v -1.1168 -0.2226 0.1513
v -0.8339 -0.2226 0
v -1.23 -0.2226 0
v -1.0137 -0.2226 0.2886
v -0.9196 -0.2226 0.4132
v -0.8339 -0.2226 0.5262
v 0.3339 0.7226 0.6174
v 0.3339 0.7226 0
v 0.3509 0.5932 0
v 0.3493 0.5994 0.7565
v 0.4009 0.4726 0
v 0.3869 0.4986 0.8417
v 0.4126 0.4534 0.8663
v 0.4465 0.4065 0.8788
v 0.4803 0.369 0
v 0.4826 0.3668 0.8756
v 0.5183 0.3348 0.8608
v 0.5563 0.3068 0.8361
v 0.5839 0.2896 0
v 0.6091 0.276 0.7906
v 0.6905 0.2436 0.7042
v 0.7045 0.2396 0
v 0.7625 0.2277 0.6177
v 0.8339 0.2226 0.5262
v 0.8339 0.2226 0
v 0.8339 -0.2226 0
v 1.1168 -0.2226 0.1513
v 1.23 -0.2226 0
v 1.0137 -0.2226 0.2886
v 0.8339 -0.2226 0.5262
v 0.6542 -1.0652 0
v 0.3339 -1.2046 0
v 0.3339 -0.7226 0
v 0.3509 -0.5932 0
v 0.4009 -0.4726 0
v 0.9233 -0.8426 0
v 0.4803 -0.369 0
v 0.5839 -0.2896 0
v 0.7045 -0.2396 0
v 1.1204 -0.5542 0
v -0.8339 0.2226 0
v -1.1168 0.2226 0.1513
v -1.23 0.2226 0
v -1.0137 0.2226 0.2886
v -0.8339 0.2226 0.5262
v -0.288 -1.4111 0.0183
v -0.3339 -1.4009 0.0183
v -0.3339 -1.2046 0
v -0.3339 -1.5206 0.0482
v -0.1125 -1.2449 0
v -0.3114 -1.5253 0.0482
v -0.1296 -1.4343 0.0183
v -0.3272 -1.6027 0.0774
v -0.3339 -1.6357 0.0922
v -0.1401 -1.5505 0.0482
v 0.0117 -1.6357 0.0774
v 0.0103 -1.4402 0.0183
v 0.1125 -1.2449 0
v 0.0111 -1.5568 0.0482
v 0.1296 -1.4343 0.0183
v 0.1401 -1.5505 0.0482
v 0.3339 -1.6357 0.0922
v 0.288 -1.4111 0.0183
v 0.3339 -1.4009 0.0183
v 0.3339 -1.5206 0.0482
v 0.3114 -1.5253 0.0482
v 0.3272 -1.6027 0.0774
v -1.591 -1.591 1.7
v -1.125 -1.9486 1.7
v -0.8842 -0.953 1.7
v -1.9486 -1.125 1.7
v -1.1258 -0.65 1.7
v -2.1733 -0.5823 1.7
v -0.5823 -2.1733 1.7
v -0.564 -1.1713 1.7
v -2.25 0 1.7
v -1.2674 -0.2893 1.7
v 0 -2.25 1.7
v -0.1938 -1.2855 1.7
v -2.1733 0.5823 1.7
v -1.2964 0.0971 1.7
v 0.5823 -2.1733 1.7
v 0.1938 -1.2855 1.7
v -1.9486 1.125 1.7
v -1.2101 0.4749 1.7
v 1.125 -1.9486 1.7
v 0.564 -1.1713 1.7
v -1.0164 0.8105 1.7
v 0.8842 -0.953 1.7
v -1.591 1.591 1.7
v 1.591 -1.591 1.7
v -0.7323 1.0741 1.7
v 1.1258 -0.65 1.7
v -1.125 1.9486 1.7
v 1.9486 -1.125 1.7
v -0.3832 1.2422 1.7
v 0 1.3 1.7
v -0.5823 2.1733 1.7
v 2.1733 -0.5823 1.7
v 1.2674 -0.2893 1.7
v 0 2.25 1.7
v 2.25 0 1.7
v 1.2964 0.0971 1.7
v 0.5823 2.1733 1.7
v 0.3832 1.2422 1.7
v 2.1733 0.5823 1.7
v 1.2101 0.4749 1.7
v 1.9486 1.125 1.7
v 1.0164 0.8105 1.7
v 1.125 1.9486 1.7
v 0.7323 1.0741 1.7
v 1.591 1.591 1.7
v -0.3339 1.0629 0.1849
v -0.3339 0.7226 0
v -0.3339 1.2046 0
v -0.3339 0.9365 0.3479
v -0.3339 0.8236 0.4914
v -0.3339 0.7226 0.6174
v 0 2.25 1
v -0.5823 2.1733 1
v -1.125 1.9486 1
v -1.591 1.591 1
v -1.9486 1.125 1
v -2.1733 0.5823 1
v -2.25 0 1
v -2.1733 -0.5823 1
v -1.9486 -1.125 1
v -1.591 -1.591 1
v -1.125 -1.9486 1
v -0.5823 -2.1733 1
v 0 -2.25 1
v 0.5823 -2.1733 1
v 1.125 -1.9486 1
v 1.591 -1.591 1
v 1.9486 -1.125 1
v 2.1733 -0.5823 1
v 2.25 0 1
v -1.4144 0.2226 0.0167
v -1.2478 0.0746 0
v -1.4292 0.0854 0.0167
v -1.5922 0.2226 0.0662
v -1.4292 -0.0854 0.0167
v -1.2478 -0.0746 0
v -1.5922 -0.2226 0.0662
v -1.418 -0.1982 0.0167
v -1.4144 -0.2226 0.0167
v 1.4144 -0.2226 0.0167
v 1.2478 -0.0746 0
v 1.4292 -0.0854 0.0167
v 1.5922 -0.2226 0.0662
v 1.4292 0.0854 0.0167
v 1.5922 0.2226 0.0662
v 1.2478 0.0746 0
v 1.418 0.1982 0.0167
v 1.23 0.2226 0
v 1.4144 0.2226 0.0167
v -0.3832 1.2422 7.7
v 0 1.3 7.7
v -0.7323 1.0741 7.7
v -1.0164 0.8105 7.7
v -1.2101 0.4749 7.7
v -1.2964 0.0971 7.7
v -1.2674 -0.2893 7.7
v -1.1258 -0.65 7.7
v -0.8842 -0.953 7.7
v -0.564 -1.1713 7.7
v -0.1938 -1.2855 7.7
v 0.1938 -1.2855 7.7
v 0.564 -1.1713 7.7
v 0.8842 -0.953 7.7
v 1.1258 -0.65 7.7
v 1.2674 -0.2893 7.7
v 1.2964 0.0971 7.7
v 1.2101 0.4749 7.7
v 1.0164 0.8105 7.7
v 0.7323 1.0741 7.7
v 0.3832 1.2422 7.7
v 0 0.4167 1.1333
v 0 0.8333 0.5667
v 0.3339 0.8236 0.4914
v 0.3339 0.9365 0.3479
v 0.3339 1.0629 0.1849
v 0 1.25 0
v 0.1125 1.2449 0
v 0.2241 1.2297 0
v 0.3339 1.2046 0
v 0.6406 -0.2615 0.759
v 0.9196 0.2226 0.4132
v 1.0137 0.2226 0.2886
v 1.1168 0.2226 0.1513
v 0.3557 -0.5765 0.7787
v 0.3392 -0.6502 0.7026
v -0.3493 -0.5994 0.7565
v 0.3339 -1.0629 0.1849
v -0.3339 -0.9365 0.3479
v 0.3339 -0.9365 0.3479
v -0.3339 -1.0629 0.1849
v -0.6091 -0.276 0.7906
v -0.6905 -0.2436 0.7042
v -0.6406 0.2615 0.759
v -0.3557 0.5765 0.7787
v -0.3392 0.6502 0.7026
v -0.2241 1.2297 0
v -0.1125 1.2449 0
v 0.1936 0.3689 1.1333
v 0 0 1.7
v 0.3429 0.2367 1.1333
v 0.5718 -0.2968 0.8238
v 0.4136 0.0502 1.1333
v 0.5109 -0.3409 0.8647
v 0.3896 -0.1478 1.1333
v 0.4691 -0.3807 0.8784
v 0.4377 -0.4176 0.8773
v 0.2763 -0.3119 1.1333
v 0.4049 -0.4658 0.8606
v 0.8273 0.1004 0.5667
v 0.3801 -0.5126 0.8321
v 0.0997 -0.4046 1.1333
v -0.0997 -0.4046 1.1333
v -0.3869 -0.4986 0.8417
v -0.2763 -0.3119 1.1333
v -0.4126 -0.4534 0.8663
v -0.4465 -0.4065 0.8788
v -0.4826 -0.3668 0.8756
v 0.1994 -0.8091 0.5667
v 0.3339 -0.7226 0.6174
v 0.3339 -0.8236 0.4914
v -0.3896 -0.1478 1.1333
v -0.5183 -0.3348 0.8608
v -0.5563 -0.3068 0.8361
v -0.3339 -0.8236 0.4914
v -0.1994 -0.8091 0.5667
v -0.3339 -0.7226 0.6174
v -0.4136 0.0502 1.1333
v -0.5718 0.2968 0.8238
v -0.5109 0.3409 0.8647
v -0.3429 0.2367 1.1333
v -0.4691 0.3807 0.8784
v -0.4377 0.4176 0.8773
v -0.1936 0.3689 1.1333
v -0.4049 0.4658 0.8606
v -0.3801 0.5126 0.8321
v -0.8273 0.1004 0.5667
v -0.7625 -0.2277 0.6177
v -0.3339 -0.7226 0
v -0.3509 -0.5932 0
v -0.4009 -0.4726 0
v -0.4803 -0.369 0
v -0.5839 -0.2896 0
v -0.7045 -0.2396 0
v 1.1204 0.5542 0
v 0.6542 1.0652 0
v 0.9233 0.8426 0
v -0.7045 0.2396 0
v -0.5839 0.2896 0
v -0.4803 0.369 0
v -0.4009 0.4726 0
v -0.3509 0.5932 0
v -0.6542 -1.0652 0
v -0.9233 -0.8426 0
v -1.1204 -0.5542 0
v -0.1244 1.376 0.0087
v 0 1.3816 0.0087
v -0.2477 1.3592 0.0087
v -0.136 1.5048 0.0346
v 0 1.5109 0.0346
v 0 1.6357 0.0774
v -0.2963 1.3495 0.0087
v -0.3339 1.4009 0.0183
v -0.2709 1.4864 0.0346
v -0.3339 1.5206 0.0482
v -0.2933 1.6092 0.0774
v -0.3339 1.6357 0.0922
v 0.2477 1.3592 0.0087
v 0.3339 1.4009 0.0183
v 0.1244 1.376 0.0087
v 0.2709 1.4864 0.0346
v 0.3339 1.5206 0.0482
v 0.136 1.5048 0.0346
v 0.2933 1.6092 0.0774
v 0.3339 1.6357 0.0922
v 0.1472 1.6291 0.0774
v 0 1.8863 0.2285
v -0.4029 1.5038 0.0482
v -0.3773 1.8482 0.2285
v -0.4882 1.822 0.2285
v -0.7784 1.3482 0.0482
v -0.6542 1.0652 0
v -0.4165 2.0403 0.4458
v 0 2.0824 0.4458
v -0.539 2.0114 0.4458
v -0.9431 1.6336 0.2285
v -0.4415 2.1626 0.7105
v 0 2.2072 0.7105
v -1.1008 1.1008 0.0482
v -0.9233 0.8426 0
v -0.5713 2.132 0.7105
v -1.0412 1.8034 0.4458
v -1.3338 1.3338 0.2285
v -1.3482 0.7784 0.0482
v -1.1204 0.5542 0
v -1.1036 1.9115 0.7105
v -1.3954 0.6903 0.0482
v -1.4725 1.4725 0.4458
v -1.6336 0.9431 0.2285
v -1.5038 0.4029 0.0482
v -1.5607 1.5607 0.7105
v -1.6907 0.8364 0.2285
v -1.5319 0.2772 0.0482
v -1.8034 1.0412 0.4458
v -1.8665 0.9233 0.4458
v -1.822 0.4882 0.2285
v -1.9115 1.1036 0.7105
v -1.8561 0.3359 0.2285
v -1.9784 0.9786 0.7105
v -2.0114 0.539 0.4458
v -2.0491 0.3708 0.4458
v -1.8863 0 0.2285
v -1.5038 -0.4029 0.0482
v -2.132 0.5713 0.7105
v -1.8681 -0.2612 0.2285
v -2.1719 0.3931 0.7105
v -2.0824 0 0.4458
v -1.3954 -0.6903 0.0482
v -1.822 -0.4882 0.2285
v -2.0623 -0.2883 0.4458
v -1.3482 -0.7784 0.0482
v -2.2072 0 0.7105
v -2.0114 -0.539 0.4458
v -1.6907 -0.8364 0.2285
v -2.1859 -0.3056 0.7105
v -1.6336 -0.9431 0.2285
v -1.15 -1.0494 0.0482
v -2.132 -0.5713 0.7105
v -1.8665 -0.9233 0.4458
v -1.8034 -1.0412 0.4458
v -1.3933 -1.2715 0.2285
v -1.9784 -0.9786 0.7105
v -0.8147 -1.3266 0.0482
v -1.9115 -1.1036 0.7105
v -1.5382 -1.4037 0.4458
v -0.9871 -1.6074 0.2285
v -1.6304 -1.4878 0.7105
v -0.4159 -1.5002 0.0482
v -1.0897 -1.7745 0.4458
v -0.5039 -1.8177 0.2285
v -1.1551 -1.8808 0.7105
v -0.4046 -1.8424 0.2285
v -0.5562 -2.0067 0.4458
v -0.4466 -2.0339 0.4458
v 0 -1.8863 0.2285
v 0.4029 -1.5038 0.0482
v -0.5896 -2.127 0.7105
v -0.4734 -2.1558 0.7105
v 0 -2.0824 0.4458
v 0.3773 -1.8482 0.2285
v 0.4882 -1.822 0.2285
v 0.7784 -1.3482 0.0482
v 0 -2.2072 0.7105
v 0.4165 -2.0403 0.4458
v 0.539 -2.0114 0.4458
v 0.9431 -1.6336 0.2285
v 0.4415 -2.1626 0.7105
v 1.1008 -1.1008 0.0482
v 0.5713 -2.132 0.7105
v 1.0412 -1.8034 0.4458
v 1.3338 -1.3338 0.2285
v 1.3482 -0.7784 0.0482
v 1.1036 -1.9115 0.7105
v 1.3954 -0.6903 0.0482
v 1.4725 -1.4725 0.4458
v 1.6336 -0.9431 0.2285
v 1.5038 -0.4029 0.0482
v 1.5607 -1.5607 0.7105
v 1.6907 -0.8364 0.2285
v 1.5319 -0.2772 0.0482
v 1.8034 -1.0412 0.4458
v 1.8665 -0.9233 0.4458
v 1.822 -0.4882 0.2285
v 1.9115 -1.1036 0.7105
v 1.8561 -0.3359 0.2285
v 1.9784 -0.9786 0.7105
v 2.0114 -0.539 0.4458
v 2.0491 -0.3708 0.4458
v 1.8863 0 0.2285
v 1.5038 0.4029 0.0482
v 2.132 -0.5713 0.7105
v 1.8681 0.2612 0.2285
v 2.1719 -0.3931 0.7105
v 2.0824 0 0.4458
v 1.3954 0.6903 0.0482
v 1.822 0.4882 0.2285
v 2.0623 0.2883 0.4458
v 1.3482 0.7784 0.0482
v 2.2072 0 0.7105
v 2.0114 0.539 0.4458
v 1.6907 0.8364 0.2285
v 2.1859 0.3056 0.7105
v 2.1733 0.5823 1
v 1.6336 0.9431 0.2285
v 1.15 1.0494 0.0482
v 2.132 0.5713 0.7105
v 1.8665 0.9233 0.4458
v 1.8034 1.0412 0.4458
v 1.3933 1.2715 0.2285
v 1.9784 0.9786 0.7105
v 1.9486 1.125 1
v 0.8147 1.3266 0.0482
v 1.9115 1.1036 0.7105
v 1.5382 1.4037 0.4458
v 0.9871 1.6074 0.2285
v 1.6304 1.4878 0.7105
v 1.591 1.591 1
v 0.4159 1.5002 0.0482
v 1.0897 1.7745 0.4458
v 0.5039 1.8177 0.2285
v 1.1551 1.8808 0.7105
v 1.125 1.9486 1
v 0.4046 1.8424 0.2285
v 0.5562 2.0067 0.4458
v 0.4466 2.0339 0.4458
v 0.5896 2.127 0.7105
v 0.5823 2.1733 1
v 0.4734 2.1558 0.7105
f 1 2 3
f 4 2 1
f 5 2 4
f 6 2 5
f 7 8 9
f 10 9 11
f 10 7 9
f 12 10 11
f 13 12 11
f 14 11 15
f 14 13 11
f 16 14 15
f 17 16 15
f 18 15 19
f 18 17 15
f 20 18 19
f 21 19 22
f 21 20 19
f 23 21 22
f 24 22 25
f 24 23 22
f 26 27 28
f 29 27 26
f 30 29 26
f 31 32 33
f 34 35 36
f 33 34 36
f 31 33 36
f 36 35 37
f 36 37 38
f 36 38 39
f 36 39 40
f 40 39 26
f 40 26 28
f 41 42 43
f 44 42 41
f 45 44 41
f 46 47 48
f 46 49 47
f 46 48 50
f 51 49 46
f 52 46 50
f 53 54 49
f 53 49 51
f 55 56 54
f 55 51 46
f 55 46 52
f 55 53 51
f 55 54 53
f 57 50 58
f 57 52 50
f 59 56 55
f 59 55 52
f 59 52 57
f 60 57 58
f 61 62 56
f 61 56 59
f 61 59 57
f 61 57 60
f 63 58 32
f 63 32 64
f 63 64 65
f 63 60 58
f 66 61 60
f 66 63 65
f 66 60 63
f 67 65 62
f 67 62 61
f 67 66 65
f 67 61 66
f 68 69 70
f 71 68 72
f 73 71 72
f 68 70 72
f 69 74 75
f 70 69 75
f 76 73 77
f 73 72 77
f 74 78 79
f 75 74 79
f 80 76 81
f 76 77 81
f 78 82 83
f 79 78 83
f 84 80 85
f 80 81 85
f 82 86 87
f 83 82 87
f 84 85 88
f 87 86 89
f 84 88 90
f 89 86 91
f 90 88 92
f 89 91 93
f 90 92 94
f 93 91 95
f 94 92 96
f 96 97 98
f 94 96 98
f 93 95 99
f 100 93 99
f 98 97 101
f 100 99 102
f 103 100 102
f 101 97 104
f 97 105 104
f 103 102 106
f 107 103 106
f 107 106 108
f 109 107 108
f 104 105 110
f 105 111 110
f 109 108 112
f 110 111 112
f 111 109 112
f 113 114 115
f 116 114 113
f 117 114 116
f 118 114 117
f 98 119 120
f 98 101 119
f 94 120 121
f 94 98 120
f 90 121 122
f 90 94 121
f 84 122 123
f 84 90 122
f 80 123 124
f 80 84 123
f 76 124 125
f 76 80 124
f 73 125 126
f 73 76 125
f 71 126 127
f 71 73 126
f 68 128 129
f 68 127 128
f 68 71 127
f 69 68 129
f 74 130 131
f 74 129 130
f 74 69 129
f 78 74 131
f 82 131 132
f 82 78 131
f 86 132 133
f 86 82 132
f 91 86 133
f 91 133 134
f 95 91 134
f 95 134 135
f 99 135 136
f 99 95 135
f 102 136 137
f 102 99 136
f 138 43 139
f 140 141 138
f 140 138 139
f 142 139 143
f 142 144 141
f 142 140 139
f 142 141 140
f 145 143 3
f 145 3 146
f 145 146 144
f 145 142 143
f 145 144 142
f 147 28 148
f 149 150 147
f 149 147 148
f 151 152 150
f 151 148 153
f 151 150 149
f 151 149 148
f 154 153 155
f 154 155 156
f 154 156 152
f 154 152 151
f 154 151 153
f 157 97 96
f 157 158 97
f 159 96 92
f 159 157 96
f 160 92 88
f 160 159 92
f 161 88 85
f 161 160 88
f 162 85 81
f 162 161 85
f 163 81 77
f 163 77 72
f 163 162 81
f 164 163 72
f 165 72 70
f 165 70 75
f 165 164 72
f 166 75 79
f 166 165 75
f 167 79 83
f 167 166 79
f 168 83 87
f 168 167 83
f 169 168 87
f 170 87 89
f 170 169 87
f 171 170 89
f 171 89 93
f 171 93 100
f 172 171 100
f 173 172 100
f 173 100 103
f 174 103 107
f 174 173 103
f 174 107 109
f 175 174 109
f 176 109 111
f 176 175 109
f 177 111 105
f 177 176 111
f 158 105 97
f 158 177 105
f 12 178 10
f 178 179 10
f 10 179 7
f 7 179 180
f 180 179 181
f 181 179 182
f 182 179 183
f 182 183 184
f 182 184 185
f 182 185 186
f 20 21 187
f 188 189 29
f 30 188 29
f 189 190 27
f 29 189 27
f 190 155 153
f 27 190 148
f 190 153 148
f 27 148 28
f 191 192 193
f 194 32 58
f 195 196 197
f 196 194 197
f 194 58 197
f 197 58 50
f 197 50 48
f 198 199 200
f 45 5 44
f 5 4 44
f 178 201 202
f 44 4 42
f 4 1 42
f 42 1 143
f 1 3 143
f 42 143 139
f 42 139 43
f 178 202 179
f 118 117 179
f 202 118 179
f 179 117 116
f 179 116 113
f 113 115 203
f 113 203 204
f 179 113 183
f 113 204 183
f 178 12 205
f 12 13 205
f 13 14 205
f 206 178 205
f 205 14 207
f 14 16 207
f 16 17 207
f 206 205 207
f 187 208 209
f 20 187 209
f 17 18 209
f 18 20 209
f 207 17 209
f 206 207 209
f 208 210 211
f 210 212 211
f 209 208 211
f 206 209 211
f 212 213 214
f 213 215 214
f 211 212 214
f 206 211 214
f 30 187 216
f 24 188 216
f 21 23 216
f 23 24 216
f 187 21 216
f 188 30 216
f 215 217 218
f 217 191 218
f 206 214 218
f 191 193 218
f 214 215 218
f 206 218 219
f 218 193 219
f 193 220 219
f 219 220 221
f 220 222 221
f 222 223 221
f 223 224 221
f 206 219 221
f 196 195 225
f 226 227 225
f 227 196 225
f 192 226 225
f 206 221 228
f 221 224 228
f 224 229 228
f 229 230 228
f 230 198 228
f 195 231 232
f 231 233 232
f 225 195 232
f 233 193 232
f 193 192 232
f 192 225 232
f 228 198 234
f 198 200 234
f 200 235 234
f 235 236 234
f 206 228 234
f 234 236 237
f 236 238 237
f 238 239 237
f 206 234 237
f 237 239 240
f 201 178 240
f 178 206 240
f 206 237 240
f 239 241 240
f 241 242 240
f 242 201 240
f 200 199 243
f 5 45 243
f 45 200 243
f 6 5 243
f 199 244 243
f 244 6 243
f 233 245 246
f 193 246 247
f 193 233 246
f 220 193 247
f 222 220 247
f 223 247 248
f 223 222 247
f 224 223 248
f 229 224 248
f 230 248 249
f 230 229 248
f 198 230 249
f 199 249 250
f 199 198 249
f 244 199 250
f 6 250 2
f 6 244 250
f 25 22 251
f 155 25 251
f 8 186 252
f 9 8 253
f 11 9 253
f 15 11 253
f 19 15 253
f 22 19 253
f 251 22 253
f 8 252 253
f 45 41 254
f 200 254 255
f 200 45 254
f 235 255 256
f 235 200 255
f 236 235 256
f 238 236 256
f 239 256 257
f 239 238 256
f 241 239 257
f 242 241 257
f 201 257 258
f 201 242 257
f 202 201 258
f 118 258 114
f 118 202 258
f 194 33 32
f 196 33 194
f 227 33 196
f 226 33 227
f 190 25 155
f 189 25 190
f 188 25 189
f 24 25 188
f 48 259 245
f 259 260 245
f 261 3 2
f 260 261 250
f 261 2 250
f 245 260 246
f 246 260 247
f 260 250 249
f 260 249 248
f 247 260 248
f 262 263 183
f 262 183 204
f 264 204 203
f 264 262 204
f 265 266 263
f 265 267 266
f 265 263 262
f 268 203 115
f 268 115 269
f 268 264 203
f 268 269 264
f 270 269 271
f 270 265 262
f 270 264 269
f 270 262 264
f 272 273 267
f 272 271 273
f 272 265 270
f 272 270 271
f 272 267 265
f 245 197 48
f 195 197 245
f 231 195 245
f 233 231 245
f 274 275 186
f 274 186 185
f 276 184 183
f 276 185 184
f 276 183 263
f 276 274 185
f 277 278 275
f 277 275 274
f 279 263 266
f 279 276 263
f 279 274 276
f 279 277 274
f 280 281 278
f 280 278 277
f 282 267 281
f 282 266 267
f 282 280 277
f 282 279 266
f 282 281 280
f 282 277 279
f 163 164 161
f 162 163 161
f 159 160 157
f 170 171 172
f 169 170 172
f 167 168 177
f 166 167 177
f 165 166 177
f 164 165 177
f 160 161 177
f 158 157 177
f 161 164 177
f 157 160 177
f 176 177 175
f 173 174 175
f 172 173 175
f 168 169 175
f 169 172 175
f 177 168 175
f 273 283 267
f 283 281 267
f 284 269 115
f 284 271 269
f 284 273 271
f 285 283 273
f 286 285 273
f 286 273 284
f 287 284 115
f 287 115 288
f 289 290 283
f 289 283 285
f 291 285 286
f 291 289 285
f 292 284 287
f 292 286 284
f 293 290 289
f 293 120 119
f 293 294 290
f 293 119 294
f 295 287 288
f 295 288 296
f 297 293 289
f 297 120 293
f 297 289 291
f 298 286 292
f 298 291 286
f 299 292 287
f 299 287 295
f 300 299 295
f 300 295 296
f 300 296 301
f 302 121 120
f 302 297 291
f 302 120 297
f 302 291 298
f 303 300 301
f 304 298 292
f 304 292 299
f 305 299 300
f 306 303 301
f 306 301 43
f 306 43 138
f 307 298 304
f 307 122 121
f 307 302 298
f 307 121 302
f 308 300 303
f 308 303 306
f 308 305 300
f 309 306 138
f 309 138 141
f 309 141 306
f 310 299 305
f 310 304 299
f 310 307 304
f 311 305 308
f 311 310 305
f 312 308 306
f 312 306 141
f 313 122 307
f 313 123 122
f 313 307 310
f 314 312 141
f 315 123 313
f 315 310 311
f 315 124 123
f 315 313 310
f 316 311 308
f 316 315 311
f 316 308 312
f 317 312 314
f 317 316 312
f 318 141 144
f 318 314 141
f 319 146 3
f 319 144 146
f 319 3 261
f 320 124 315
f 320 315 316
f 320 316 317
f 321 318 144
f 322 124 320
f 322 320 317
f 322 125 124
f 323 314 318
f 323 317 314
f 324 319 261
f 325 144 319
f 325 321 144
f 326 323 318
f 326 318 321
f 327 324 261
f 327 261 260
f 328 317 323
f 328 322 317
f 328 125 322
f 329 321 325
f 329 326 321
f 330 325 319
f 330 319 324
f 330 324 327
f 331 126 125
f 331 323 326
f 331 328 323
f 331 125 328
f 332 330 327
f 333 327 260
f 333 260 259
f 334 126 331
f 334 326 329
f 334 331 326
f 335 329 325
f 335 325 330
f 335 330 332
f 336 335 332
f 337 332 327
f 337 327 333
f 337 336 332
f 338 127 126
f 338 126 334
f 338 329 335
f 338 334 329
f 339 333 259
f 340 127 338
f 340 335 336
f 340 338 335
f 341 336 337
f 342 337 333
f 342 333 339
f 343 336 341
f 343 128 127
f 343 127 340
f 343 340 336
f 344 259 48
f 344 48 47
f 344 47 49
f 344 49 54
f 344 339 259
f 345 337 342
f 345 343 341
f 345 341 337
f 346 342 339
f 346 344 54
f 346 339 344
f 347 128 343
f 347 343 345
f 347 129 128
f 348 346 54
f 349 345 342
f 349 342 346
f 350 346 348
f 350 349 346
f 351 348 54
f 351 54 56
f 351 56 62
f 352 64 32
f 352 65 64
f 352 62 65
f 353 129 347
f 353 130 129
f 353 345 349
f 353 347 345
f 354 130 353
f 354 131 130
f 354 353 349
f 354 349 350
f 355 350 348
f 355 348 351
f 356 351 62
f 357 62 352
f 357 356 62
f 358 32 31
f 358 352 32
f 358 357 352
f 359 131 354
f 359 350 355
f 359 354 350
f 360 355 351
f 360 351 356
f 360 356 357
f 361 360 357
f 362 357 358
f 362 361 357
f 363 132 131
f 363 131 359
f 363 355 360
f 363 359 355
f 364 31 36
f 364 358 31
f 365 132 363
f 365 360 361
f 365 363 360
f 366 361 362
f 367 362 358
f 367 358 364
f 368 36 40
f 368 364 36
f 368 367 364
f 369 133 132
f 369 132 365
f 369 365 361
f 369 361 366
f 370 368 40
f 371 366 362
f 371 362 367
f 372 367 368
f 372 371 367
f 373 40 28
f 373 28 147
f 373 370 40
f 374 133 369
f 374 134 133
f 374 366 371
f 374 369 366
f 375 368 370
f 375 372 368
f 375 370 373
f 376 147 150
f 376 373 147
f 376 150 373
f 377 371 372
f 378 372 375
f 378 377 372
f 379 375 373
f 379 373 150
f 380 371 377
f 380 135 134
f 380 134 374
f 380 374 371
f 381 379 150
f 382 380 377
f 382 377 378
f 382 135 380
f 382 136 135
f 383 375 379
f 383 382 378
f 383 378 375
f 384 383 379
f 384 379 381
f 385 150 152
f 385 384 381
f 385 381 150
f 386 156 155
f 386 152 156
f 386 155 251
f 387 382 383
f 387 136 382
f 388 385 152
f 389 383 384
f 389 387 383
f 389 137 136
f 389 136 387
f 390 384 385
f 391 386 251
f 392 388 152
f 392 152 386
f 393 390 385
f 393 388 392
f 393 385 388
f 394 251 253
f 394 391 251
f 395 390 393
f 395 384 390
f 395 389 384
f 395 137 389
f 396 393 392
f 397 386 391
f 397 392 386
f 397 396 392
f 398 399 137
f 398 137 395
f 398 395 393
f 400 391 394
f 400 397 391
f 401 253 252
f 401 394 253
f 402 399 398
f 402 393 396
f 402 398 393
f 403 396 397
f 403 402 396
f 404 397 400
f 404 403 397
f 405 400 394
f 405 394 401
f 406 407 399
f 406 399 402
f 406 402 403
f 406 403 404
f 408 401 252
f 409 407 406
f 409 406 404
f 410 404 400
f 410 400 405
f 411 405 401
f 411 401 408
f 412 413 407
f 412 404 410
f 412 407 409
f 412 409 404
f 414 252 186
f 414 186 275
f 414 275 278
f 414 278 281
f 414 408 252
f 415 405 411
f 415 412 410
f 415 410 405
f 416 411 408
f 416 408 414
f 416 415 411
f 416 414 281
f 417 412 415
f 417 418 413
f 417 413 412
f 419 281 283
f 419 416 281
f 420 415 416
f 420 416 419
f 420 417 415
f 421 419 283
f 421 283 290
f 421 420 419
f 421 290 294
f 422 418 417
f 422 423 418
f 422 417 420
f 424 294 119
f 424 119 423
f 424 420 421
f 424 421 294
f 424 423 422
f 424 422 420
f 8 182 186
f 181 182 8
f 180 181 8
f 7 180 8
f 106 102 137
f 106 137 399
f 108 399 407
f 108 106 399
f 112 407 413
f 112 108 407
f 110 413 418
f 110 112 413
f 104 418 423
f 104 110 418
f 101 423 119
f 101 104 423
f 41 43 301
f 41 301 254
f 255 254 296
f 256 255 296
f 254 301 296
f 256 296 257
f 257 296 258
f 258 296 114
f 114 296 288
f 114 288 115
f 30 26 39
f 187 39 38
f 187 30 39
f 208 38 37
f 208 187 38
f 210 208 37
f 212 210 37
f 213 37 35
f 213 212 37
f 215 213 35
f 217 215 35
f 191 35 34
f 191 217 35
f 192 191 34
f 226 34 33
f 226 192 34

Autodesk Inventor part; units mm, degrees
ref_plane "YZ Plane" through (0, 0, 0) normal (1, 0, 0) x (0, 1, 0)
ref_plane "XZ Plane" through (0, 0, 0) normal (0, 1, 0) x (-1, 0, 0)
ref_plane "XY Plane" through (0, 0, 0) normal (0, 0, 1) x (1, 0, 0)
sketch "スケッチ1" plane through (0, 0, 0) normal (1, 0, 0) x (0, 1, 0)
  line L0 (0, 7.7) -> (0, 0)
  line L1 (0, 0) -> (1.25, 0)
  line L2 (2.25, 1) -> (2.25, 1.7)
  line L3 (2.25, 1.7) -> (1.3, 1.7)
  line L4 (1.3, 1.7) -> (1.3, 7.7)
  line L5 (1.3, 7.7) -> (0, 7.7)
  line L6 (1.25, 0) -> (0, 1.7)
  arc A0 (1.25, 0) -> (2.25, 1) centre (1.25, 1) ccw
  line L7 (1.25, 0) -> (2.25, 0)
  line L8 (2.25, 0) -> (2.25, 1)
  dimension "d2" = 1.7
  dimension "d10" = 6
  dimension "d11" = 2.6
  dimension "d12" = 4.5
  dimension "d14" = 1
revolve "回転1" add sketch "スケッチ1" angle 360 about axis through (0, 0, 7.7) along (0, 0, -1) contours L5 L4 L3 L2 A0 L6 L0
thread "ねじ1" size "M2.6x0.45" class "6g" standard "ANSI Metric M Profile" full length
sketch "スケッチ2" plane through (0, 0, 1.7) normal (0, 0, 1) x (1, 0, 0)
  line L0 (0.3339, -1.6357) -> (-0.3339, -1.6357)
  line L1 (-0.3339, -1.6357) -> (-0.3339, -0.7226)
  line L2 (-0.3339, 1.6357) -> (0.3339, 1.6357)
  line L3 (0.3339, 1.6357) -> (0.3339, 0.7226)
  line L4 (0.3339, -1.6357) -> (-0.3339, 1.6357) construction
  line L5 (-0.3339, -1.6357) -> (0.3339, 1.6357) construction
  line L6 (-1.5922, 0.2226) -> (-0.8339, 0.2226)
  line L7 (1.5922, 0.2226) -> (1.5922, -0.2226)
  line L8 (1.5922, -0.2226) -> (0.8339, -0.2226)
  line L9 (-1.5922, -0.2226) -> (-1.5922, 0.2226)
  line L10 (-1.5922, 0.2226) -> (1.5922, -0.2226) construction
  line L11 (1.5922, 0.2226) -> (-1.5922, -0.2226) construction
  circle A0 centre (0, 0) radius 2.25
  line L12 (0.3339, -0.7226) -> (0.3339, -1.6357)
  line L13 (0.8339, 0.2226) -> (1.5922, 0.2226)
  line L14 (-0.8339, -0.2226) -> (-1.5922, -0.2226)
  line L15 (-0.3339, 0.7226) -> (-0.3339, 1.6357)
  arc A1 (0.8339, -0.2226) -> (0.3339, -0.7226) centre (0.8339, -0.7226) ccw
  arc A2 (0.3339, 0.7226) -> (0.8339, 0.2226) centre (0.8339, 0.7226) ccw
  arc A3 (-0.8339, 0.2226) -> (-0.3339, 0.7226) centre (-0.8339, 0.7226) ccw
  arc A4 (-0.3339, -0.7226) -> (-0.8339, -0.2226) centre (-0.8339, -0.7226) ccw
  point P0 (0, 0)
  point P1 (-0.3339, -0.2226)
  point P2 (-0.3339, 0.2226)
  point P3 (0.3339, 0.2226)
  point P4 (0.3339, -0.2226)
  dimension "d18" = 0.5
extrude "押し出し2" add sketch "スケッチ2" against normal blind 1.7
revolve "回転2" cut sketch "スケッチ1" angle 360 about axis through (0, 0, 7.7) along (0, 0, -1) contours A0 L8 L7
properties part number "F-2606EB" material "チタン"
